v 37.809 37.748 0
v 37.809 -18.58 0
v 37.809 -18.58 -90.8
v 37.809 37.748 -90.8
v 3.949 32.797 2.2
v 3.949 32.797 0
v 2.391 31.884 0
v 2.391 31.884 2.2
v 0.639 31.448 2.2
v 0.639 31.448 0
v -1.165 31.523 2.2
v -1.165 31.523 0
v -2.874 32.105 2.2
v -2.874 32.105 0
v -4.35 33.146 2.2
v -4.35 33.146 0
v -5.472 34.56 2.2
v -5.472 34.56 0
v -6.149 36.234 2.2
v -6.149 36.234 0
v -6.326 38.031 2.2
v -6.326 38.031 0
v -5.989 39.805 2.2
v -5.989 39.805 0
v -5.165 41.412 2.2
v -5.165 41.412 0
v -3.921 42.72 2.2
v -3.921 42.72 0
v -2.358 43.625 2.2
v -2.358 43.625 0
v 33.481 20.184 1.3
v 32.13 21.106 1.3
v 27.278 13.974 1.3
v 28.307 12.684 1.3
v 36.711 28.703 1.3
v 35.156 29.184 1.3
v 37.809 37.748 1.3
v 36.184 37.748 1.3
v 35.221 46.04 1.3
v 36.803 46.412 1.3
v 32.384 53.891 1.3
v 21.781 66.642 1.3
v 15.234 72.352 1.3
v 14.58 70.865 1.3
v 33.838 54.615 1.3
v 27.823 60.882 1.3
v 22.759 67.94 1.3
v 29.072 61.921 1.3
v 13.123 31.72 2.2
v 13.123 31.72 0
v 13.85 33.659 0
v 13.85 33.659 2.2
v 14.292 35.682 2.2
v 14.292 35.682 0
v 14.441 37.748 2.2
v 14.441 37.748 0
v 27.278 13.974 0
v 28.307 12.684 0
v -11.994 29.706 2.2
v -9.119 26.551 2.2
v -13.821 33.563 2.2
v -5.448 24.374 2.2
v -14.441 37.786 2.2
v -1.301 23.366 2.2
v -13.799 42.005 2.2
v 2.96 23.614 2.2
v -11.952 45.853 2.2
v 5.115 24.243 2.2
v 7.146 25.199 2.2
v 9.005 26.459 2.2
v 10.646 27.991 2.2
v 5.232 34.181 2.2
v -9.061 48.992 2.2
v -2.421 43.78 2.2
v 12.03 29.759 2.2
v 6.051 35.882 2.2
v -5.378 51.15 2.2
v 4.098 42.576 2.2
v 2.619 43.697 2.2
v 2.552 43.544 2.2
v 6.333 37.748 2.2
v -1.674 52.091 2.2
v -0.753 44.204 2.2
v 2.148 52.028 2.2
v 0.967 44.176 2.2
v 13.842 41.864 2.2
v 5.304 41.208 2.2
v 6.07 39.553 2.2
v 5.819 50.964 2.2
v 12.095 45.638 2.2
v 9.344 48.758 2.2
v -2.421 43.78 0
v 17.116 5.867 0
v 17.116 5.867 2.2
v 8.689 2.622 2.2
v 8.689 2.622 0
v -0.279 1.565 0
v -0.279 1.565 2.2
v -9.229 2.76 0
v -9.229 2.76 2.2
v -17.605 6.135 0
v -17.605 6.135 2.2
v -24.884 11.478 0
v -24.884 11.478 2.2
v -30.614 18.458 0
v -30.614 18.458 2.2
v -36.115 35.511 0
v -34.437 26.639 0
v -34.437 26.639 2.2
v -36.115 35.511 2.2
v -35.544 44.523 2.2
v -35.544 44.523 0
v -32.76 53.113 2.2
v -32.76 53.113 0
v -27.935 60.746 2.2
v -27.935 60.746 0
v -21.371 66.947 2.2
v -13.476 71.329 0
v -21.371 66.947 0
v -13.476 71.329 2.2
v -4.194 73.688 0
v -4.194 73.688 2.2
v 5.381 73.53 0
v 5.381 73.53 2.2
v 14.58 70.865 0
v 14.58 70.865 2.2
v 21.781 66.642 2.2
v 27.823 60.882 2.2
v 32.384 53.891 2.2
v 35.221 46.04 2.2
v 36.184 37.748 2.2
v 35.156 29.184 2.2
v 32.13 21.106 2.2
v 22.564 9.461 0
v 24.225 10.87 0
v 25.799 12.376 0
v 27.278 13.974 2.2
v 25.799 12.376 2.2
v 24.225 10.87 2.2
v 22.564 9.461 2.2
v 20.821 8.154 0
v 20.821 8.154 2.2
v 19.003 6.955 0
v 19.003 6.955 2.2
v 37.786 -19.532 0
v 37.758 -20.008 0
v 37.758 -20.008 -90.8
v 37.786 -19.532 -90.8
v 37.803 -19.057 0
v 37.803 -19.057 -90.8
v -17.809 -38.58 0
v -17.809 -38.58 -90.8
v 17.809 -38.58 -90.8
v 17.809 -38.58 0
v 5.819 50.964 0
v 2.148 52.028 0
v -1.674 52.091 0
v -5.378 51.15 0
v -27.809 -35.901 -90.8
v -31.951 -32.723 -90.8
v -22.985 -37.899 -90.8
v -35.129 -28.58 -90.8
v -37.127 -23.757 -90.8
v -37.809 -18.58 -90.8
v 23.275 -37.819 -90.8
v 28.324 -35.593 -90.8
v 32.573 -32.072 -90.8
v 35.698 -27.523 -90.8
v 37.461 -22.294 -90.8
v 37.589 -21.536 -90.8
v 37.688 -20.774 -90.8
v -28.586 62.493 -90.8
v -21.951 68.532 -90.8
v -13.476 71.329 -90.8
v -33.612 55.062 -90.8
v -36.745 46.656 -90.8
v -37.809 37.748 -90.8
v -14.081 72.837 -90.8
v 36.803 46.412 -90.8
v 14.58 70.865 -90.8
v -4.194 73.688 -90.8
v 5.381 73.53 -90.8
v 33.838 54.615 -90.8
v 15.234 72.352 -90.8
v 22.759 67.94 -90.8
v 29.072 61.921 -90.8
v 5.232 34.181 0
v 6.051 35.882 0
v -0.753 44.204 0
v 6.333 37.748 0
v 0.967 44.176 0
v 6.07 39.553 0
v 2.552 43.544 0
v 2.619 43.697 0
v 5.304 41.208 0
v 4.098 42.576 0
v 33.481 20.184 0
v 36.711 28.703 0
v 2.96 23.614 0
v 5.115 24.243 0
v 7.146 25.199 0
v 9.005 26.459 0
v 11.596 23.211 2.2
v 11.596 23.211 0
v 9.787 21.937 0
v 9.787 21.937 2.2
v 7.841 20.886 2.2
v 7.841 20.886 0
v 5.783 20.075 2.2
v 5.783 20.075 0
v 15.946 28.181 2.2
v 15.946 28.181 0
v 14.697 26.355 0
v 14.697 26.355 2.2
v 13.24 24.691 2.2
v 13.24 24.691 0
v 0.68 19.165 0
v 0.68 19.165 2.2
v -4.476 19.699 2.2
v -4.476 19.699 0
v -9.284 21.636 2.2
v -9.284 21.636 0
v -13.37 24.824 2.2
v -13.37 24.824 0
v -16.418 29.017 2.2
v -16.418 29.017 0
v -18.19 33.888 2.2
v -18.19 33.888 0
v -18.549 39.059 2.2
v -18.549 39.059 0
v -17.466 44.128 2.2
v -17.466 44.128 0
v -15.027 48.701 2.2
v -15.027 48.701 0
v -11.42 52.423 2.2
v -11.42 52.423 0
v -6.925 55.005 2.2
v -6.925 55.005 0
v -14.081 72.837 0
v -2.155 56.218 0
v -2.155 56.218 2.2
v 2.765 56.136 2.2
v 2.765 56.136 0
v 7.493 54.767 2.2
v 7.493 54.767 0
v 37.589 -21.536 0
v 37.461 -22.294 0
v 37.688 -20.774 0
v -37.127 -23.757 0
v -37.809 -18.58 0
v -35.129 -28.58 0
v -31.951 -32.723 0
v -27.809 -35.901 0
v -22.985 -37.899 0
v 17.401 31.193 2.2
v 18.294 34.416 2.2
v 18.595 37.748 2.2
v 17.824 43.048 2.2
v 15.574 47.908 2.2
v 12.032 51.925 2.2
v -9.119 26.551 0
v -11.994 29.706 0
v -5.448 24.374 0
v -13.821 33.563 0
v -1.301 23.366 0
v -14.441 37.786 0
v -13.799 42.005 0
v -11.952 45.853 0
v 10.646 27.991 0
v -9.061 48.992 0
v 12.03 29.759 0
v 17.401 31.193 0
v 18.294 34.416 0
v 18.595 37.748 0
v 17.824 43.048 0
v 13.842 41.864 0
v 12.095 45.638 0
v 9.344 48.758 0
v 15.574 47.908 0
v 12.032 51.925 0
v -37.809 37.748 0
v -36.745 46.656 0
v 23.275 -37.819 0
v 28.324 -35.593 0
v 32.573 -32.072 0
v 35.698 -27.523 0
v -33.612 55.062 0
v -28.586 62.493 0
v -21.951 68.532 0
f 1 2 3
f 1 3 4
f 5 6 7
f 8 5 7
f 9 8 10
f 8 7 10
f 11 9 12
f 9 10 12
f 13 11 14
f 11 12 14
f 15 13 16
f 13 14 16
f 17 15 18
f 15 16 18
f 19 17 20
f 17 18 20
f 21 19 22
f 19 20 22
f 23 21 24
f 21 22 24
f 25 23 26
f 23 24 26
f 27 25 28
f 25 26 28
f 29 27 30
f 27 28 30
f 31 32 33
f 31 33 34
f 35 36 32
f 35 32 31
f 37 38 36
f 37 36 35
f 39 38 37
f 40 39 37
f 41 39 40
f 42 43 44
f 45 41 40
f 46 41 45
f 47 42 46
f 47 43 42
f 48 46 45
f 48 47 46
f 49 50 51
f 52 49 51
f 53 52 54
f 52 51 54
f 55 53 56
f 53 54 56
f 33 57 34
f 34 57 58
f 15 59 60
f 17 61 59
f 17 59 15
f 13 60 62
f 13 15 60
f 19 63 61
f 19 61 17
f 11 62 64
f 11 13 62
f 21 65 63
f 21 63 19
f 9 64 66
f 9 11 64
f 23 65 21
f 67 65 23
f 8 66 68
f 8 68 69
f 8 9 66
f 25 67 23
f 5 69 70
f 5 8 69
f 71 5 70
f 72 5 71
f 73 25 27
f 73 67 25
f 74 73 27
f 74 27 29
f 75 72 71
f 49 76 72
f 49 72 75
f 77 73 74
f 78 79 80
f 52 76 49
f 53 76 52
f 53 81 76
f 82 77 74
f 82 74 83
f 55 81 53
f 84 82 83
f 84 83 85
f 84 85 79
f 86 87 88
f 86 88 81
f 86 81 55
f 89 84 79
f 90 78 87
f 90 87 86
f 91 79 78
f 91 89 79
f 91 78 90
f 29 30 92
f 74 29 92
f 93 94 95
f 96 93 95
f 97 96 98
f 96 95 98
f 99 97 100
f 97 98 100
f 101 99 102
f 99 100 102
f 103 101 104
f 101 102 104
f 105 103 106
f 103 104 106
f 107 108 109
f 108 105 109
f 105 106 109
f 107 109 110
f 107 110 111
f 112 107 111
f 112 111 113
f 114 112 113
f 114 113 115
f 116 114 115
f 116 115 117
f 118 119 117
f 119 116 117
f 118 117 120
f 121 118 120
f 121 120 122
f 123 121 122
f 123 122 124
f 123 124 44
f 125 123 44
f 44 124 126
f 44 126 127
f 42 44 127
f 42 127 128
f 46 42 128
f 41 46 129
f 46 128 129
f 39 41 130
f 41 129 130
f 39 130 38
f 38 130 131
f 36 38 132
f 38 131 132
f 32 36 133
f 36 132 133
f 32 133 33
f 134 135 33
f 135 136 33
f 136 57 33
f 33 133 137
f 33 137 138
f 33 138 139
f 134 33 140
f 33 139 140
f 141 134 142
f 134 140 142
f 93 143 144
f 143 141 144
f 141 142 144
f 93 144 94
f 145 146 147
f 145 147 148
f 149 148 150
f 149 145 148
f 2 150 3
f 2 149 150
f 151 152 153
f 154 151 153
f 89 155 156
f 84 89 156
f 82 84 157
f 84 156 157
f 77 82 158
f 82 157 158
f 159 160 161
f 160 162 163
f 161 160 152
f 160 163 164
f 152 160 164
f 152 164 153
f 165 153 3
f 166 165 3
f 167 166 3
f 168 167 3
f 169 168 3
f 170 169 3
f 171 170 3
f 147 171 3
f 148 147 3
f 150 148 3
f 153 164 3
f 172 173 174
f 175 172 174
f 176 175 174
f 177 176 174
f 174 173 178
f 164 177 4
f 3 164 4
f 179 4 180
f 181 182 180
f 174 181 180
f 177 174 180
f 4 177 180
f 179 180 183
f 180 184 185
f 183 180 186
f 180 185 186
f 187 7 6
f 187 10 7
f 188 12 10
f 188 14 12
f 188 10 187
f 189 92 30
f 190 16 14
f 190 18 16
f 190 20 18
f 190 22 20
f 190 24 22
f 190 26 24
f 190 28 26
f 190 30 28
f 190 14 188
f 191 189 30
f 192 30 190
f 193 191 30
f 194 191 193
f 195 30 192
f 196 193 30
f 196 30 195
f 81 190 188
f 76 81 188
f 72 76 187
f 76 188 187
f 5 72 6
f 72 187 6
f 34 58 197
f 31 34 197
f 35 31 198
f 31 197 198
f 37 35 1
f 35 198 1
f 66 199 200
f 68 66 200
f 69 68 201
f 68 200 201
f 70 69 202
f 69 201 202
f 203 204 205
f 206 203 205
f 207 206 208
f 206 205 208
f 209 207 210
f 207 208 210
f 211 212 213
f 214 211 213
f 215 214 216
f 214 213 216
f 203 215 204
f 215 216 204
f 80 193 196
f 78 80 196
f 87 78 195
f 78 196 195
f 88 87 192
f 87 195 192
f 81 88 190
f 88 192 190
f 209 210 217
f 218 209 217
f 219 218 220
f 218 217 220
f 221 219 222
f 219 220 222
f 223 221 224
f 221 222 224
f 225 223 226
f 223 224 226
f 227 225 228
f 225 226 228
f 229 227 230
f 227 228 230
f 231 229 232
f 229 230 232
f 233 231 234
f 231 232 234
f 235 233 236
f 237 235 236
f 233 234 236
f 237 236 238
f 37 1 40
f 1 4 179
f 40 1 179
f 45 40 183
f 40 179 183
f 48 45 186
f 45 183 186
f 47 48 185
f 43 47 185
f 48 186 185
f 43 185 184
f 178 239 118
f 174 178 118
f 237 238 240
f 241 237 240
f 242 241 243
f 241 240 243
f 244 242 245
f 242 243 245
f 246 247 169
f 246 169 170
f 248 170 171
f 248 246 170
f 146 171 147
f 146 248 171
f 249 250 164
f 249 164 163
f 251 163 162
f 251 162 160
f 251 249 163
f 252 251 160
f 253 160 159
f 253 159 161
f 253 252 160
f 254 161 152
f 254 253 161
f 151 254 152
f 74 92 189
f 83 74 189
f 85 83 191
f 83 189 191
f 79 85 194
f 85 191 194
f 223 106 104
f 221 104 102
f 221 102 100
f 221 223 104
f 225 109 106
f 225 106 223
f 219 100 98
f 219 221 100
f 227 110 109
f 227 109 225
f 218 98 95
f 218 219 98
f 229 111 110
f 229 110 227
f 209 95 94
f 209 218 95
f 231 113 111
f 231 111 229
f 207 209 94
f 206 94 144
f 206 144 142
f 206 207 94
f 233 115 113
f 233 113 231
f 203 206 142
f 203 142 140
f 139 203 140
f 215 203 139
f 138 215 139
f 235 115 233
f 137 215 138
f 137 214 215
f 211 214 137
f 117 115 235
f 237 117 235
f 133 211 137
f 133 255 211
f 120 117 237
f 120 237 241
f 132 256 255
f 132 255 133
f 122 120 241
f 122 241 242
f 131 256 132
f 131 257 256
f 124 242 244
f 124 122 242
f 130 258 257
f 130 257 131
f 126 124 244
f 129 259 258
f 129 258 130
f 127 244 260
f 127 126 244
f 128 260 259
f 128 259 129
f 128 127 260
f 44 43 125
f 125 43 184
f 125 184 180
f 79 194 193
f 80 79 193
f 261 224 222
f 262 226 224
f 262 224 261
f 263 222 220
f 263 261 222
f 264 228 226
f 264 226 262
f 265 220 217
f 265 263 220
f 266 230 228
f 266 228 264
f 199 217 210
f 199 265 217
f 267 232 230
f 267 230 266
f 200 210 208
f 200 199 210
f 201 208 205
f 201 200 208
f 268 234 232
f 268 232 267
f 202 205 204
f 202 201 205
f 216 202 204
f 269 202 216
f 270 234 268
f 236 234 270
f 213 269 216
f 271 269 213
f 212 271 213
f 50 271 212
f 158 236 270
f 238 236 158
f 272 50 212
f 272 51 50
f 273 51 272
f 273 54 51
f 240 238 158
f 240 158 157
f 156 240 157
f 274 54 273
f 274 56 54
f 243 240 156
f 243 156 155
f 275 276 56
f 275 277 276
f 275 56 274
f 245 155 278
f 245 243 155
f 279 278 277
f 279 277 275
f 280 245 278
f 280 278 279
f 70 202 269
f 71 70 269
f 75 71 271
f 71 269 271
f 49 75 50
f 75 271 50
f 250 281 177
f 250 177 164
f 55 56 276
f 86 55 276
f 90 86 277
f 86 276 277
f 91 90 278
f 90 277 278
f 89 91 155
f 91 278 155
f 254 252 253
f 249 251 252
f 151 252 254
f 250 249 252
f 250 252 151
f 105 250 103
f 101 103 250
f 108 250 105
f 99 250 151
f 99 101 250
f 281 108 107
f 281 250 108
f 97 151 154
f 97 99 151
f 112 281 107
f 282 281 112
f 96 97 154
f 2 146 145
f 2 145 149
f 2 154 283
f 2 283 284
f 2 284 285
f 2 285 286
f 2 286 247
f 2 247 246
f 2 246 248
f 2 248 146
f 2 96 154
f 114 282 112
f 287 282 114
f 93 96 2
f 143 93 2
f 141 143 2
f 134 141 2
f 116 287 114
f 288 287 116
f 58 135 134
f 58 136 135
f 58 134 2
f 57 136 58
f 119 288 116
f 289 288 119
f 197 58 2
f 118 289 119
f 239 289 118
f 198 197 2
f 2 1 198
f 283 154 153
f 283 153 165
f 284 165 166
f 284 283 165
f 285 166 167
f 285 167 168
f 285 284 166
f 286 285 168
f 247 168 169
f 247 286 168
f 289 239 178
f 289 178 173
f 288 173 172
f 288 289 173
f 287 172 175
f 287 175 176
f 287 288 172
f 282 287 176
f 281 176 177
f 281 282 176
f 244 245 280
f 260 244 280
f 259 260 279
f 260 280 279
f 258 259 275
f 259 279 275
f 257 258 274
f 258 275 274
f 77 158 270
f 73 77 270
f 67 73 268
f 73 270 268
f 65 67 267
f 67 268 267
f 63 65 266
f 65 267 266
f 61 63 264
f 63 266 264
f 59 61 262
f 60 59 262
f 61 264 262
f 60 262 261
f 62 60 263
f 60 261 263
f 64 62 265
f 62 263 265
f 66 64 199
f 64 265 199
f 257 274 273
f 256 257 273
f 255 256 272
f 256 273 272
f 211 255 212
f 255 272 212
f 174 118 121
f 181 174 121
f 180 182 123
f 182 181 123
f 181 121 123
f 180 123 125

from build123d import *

# Parameters (mm, degrees)
F1_DEPTH = 90.8
F2_DEPTH = 2.2
F3_DEPTH = 98.2
F4_DEPTH = 1.3


with BuildPart() as f1:
    # F0 (on Top) → F1 (new body)
    with BuildSketch(Plane.XY):
        with BuildLine():
            Line((14.5797743075, 70.8647903861), (15.2343665475, 72.3516513901))
            ThreePointArc((15.2343665475, 72.3516513901), (9.7510541905, 74.2776447369), (4.0373458892, 75.3405192466))
            Line((4.0373458892, 75.3405192466), (-3.8493320938, 75.3602360583))
            ThreePointArc((-3.8493320938, 75.3602360583), (-9.0534728718, 74.4567533778), (-14.0809194048, 72.8368325308))
            Line((-14.0809194048, 72.8368325308), (-13.4758886314, 71.3291242006))
            ThreePointArc((-13.4758886314, 71.3291242006), (0.5987840757, 73.9271667972), (14.5797743075, 70.8647903861))
        make_face()
        with BuildLine():
            ThreePointArc((17.1155876174, 5.8674587356), (-32.7813859307, 22.4284787369), (-13.4758886314, 71.3291242006))
            Line((-13.4758886314, 71.3291242006), (-14.0809194048, 72.8368325308))
            ThreePointArc((-14.0809194048, 72.8368325308), (-31.3200658488, 58.9271489213), (-37.8088560378, 37.7478413284))
            ThreePointArc((-37.8088560378, 37.7478413284), (-34.519772796, 22.3240000103), (-25.2247735802, 9.5836727321))
            ThreePointArc((-25.2247735802, 9.5836727321), (-4.3356388326, 0.1883973655), (18.1446666572, 4.5773624836))
            Line((18.1446666572, 4.5773624836), (17.1155876174, 5.8674587356))
        make_face()
        with BuildLine():
            ThreePointArc((28.3074712637, 12.6839895584), (35.3538024878, 24.3456682007), (37.8088560378, 37.7478413284))
            ThreePointArc((37.8088560378, 37.7478413284), (31.6662562242, 58.4059586587), (15.2343665475, 72.3516513901))
            Line((15.2343665475, 72.3516513901), (14.5797743075, 70.8647903861))
            ThreePointArc((14.5797743075, 70.8647903861), (30.3056164149, 57.5183179908), (36.1842802022, 37.7478413284))
            ThreePointArc((36.1842802022, 37.7478413284), (33.8847393486, 25.0542770919), (27.2783922239, 13.9740858104))
            Line((27.2783922239, 13.9740858104), (28.3074712637, 12.6839895584))
        make_face()
        with BuildLine():
            Line((7.4925671367, 54.7666894219), (14.5797743075, 70.8647903861))
            ThreePointArc((14.5797743075, 70.8647903861), (0.5987840757, 73.9271667972), (-13.4758886314, 71.3291242006))
            Line((-13.4758886314, 71.3291242006), (-6.9252786887, 55.0053112418))
            ThreePointArc((-6.9252786887, 55.0053112418), (0.3077160039, 56.3404490957), (7.4925671367, 54.7666894219))
        make_face()
        with BuildLine():
            ThreePointArc((36.1842802022, 37.7478413284), (30.3056164149, 57.5183179908), (14.5797743075, 70.8647903861))
            Line((14.5797743075, 70.8647903861), (7.4925671367, 54.7666894219))
            ThreePointArc((7.4925671367, 54.7666894219), (15.5741001759, 47.9079179245), (18.5951540119, 37.7478413284))
            ThreePointArc((18.5951540119, 37.7478413284), (17.9205267119, 32.7845284132), (15.9455954142, 28.1813508739))
            Line((15.9455954142, 28.1813508739), (27.2783922239, 13.9740858104))
            ThreePointArc((27.2783922239, 13.9740858104), (33.8847393486, 25.0542770919), (36.1842802022, 37.7478413284))
        make_face()
        with BuildLine():
            Line((-6.9252786887, 55.0053112418), (-13.4758886314, 71.3291242006))
            ThreePointArc((-13.4758886314, 71.3291242006), (-32.7813859307, 22.4284787369), (17.1155876174, 5.8674587356))
            Line((17.1155876174, 5.8674587356), (5.7827908077, 20.0747237991))
            ThreePointArc((5.7827908077, 20.0747237991), (-17.4746331696, 31.3904088029), (-6.9252786887, 55.0053112418))
        make_face()
        with BuildLine():
            Line((5.8186014769, 50.9643921908), (7.4925671367, 54.7666894219))
            ThreePointArc((7.4925671367, 54.7666894219), (0.3077160039, 56.3404490957), (-6.9252786887, 55.0053112418))
            Line((-6.9252786887, 55.0053112418), (-5.3780548203, 51.1497018781))
            ThreePointArc((-5.3780548203, 51.1497018781), (0.2389670672, 52.1865474541), (5.8186014769, 50.9643921908))
        make_face()
        with BuildLine():
            Line((-5.3780548203, 51.1497018781), (-6.9252786887, 55.0053112418))
            ThreePointArc((-6.9252786887, 55.0053112418), (-17.4746331696, 31.3904088029), (5.7827908077, 20.0747237991))
            Line((5.7827908077, 20.0747237991), (2.9598041396, 23.6137372075))
            ThreePointArc((2.9598041396, 23.6137372075), (-13.8209739771, 33.5628660392), (-5.3780548203, 51.1497018781))
        make_face()
        with BuildLine():
            ThreePointArc((18.5951540119, 37.7478413284), (15.5741001759, 47.9079179245), (7.4925671367, 54.7666894219))
            Line((7.4925671367, 54.7666894219), (5.8186014769, 50.9643921908))
            ThreePointArc((5.8186014769, 50.9643921908), (12.0945839566, 45.6379857353), (14.4406834965, 37.7478413284))
            ThreePointArc((14.4406834965, 37.7478413284), (14.1073168851, 34.6628858754), (13.1226087461, 31.7203642823))
            Line((13.1226087461, 31.7203642823), (15.9455954142, 28.1813508739))
            ThreePointArc((15.9455954142, 28.1813508739), (17.9205267119, 32.7845284132), (18.5951540119, 37.7478413284))
        make_face()
        with BuildLine():
            ThreePointArc((9.0050181393, 26.4587763469), (11.3722928557, 28.848161837), (13.1226087461, 31.7203642823))
            Line((13.1226087461, 31.7203642823), (5.0814023033, 41.8011548658))
            ThreePointArc((5.0814023033, 41.8011548658), (3.9651803512, 42.8983116741), (2.619052596, 43.6968381765))
            Line((2.619052596, 43.6968381765), (2.5515787198, 43.5435759329))
            ThreePointArc((2.5515787198, 43.5435759329), (5.3037285971, 41.2078350476), (6.3325424253, 37.7478413284))
            ThreePointArc((6.3325424253, 37.7478413284), (5.7055938383, 35.000607716), (3.9488892214, 32.7973496875))
            Line((3.9488892214, 32.7973496875), (9.0050181393, 26.4587763469))
        make_face()
        with BuildLine():
            ThreePointArc((2.9598041396, 23.6137372075), (6.1492117355, 24.6818344832), (9.0050181393, 26.4587763469))
            Line((9.0050181393, 26.4587763469), (3.9488892214, 32.7973496875))
            ThreePointArc((3.9488892214, 32.7973496875), (-5.4718414208, 34.5603587741), (-2.3583897759, 43.6248381153))
            Line((-2.3583897759, 43.6248381153), (-2.4207549691, 43.7802492539))
            ThreePointArc((-2.4207549691, 43.7802492539), (-6.2849849078, 39.405841542), (-5.0814023033, 33.694527791))
            Line((-5.0814023033, 33.694527791), (2.9598041396, 23.6137372075))
        make_face()
        with BuildLine():
            Line((2.5515787198, 43.5435759329), (2.619052596, 43.6968381765))
            ThreePointArc((2.619052596, 43.6968381765), (0.1075631868, 44.2469512798), (-2.4207549691, 43.7802492539))
            Line((-2.4207549691, 43.7802492539), (-2.3583897759, 43.6248381153))
            ThreePointArc((-2.3583897759, 43.6248381153), (0.1047920683, 44.0795166352), (2.5515787198, 43.5435759329))
        make_face()
        with BuildLine():
            Line((2.619052596, 43.6968381765), (5.8186014769, 50.9643921908))
            ThreePointArc((5.8186014769, 50.9643921908), (0.2389670672, 52.1865474541), (-5.3780548203, 51.1497018781))
            Line((-5.3780548203, 51.1497018781), (-2.4207549691, 43.7802492539))
            ThreePointArc((-2.4207549691, 43.7802492539), (0.1075631868, 44.2469512798), (2.619052596, 43.6968381765))
        make_face()
        with BuildLine():
            Line((0, 37.7478413284), (2.5515787198, 43.5435759329))
            ThreePointArc((2.5515787198, 43.5435759329), (0.1047920683, 44.0795166352), (-2.3583897759, 43.6248381153))
            Line((-2.3583897759, 43.6248381153), (0, 37.7478413284))
        make_face()
        with BuildLine():
            ThreePointArc((6.3325424253, 37.7478413284), (5.3037285971, 41.2078350476), (2.5515787198, 43.5435759329))
            Line((2.5515787198, 43.5435759329), (0, 37.7478413284))
            Line((0, 37.7478413284), (3.9488892214, 32.7973496875))
            ThreePointArc((3.9488892214, 32.7973496875), (5.7055938383, 35.000607716), (6.3325424253, 37.7478413284))
        make_face()
        with BuildLine():
            ThreePointArc((-2.3583897759, 43.6248381153), (-5.4718414208, 34.5603587741), (3.9488892214, 32.7973496875))
            Line((3.9488892214, 32.7973496875), (0, 37.7478413284))
            Line((0, 37.7478413284), (-2.3583897759, 43.6248381153))
        make_face()
        with BuildLine():
            ThreePointArc((14.4406834965, 37.7478413284), (12.0945839566, 45.6379857353), (5.8186014769, 50.9643921908))
            Line((5.8186014769, 50.9643921908), (2.619052596, 43.6968381765))
            ThreePointArc((2.619052596, 43.6968381765), (3.9651803512, 42.8983116741), (5.0814023033, 41.8011548658))
            Line((5.0814023033, 41.8011548658), (13.1226087461, 31.7203642823))
            ThreePointArc((13.1226087461, 31.7203642823), (14.1073168851, 34.6628858754), (14.4406834965, 37.7478413284))
        make_face()
        with BuildLine():
            Line((-2.4207549691, 43.7802492539), (-5.3780548203, 51.1497018781))
            ThreePointArc((-5.3780548203, 51.1497018781), (-13.8209739771, 33.5628660392), (2.9598041396, 23.6137372075))
            Line((2.9598041396, 23.6137372075), (-5.0814023033, 33.694527791))
            ThreePointArc((-5.0814023033, 33.694527791), (-6.2849849078, 39.405841542), (-2.4207549691, 43.7802492539))
        make_face()
        with BuildLine():
            ThreePointArc((11.5956906903, 23.2110015706), (13.9930948371, 25.5014929091), (15.9455954142, 28.1813508739))
            Line((15.9455954142, 28.1813508739), (13.1226087461, 31.7203642823))
            ThreePointArc((13.1226087461, 31.7203642823), (11.3722928557, 28.848161837), (9.0050181393, 26.4587763469))
            Line((9.0050181393, 26.4587763469), (11.5956906903, 23.2110015706))
        make_face()
        with BuildLine():
            ThreePointArc((22.564035813, 9.4606282882), (25.0231839072, 11.6108483703), (27.2783922239, 13.9740858104))
            Line((27.2783922239, 13.9740858104), (15.9455954142, 28.1813508739))
            ThreePointArc((15.9455954142, 28.1813508739), (13.9930948371, 25.5014929091), (11.5956906903, 23.2110015706))
            Line((11.5956906903, 23.2110015706), (22.564035813, 9.4606282882))
        make_face()
        with BuildLine():
            ThreePointArc((17.1155876174, 5.8674587356), (19.9209900797, 7.5409499293), (22.564035813, 9.4606282882))
            Line((22.564035813, 9.4606282882), (11.5956906903, 23.2110015706))
            ThreePointArc((11.5956906903, 23.2110015706), (8.8296072596, 21.3827019043), (5.7827908077, 20.0747237991))
            Line((5.7827908077, 20.0747237991), (17.1155876174, 5.8674587356))
        make_face()
        with BuildLine():
            ThreePointArc((5.7827908077, 20.0747237991), (8.8296072596, 21.3827019043), (11.5956906903, 23.2110015706))
            Line((11.5956906903, 23.2110015706), (9.0050181393, 26.4587763469))
            ThreePointArc((9.0050181393, 26.4587763469), (6.1492117355, 24.6818344832), (2.9598041396, 23.6137372075))
            Line((2.9598041396, 23.6137372075), (5.7827908077, 20.0747237991))
        make_face()
        with BuildLine():
            ThreePointArc((25.2247735802, 9.5836727321), (26.8109735111, 11.0892349455), (28.3074712637, 12.6839895584))
            Line((28.3074712637, 12.6839895584), (27.2783922239, 13.9740858104))
            ThreePointArc((27.2783922239, 13.9740858104), (25.0231839072, 11.6108483703), (22.564035813, 9.4606282882))
            Line((22.564035813, 9.4606282882), (23.5770996941, 8.1906093047))
            ThreePointArc((23.5770996941, 8.1906093047), (24.4108759613, 8.8753850821), (25.2247735802, 9.5836727321))
        make_face()
        with BuildLine():
            ThreePointArc((18.1446666572, 4.5773624836), (20.9389669042, 6.266588814), (23.5770996941, 8.1906093047))
            Line((23.5770996941, 8.1906093047), (22.564035813, 9.4606282882))
            ThreePointArc((22.564035813, 9.4606282882), (19.9209900797, 7.5409499293), (17.1155876174, 5.8674587356))
            Line((17.1155876174, 5.8674587356), (18.1446666572, 4.5773624836))
        make_face()
        with BuildLine():
            Line((25.9509916616, 9.5836727321), (25.2247735802, 9.5836727321))
            ThreePointArc((25.2247735802, 9.5836727321), (24.4108759613, 8.8753850821), (23.5770996941, 8.1906093047))
            Line((23.5770996941, 8.1906093047), (31.9509916616, -2.3072496786))
            Line((31.9509916616, -2.3072496786), (31.9509916616, 3.5836727321))
            ThreePointArc((31.9509916616, 3.5836727321), (30.1936323487, 7.8263134192), (25.9509916616, 9.5836727321))
        make_face()
        with BuildLine():
            Line((37.8088560378, 0.7726587349), (28.3074712637, 12.6839895584))
            ThreePointArc((28.3074712637, 12.6839895584), (26.8109735111, 11.0892349455), (25.2247735802, 9.5836727321))
            Line((25.2247735802, 9.5836727321), (25.9509916616, 9.5836727321))
            ThreePointArc((25.9509916616, 9.5836727321), (30.1936323487, 7.8263134192), (31.9509916616, 3.5836727321))
            Line((31.9509916616, 3.5836727321), (31.9509916616, -2.3072496786))
            Line((31.9509916616, -2.3072496786), (37.5423985462, -9.316869724))
            ThreePointArc((37.5423985462, -9.316869724), (37.6746019819, -9.2135722748), (37.8088560378, -9.1129543843))
            Line((37.8088560378, -9.1129543843), (37.8088560378, 0.7726587349))
        make_face()
        with BuildLine():
            Line((31.9509916616, -2.3072496786), (23.5770996941, 8.1906093047))
            ThreePointArc((23.5770996941, 8.1906093047), (20.9389669042, 6.266588814), (18.1446666572, 4.5773624836))
            Line((18.1446666572, 4.5773624836), (31.950989986, -12.7308182222))
            ThreePointArc((31.950989986, -12.7308182222), (31.9509912427, -12.7267248551), (31.9509916616, -12.7226314879))
            Line((31.9509916616, -12.7226314879), (31.9509916616, -2.3072496786))
        make_face()
        with BuildLine():
            ThreePointArc((34.4023500944, -15.8039451307), (35.2356894452, -12.2038174301), (37.5423985462, -9.316869724))
            Line((37.5423985462, -9.316869724), (31.9509916616, -2.3072496786))
            Line((31.9509916616, -2.3072496786), (31.9509916616, -12.7226314879))
            ThreePointArc((31.9509916616, -12.7226314879), (31.9509912427, -12.7267248551), (31.950989986, -12.7308182222))
            Line((31.950989986, -12.7308182222), (34.4023500944, -15.8039451307))
        make_face()
        with BuildLine():
            Line((37.8088560378, -18.5804958642), (37.8088560378, -9.6509119093))
            Line((37.8088560378, -9.6509119093), (37.5423985462, -9.316869724))
            ThreePointArc((37.5423985462, -9.316869724), (35.2356894452, -12.2038174301), (34.4023500944, -15.8039451307))
            Line((34.4023500944, -15.8039451307), (37.6630889461, -19.8917428692))
            ThreePointArc((37.6630889461, -19.8917428692), (37.7101411831, -19.950037218), (37.7578621419, -20.0077854145))
            ThreePointArc((37.7578621419, -20.0077854145), (37.7961034982, -19.2945959688), (37.8088560378, -18.5804958642))
        make_face()
        with BuildLine():
            Line((37.8088560378, -9.6509119093), (37.8088560378, -9.1129543843))
            ThreePointArc((37.8088560378, -9.1129543843), (37.6746019819, -9.2135722748), (37.5423985462, -9.316869724))
            Line((37.5423985462, -9.316869724), (37.8088560378, -9.6509119093))
        make_face()
        with BuildLine():
            Line((37.6630889461, -19.8917428692), (34.4023500944, -15.8039451307))
            ThreePointArc((34.4023500944, -15.8039451307), (35.1982840172, -19.3947286188), (37.4610329077, -22.294246566))
            ThreePointArc((37.4610329077, -22.294246566), (37.6424235279, -21.1552969472), (37.7578621419, -20.0077854145))
            ThreePointArc((37.7578621419, -20.0077854145), (37.7101411831, -19.950037218), (37.6630889461, -19.8917428692))
        make_face()
        with BuildLine():
            ThreePointArc((37.4610329077, -22.294246566), (35.1982840172, -19.3947286188), (34.4023500944, -15.8039451307))
            Line((34.4023500944, -15.8039451307), (31.950989986, -12.7308182222))
            ThreePointArc((31.950989986, -12.7308182222), (26.0902325414, -26.8676612631), (11.9509916616, -32.7226314879))
            Line((11.9509916616, -32.7226314879), (-11.2525294721, -32.7226314879))
            ThreePointArc((-11.2525294721, -32.7226314879), (-25.3946650958, -26.8647671116), (-31.2525294721, -12.7226314879))
            Line((-31.2525294721, -12.7226314879), (-31.2525294721, 3.5836727321))
            ThreePointArc((-31.2525294721, 3.5836727321), (-29.4951701592, 7.8263134192), (-25.2525294721, 9.5836727321))
            Line((-25.2525294721, 9.5836727321), (-25.2247735802, 9.5836727321))
            ThreePointArc((-25.2247735802, 9.5836727321), (-34.519772796, 22.3240000103), (-37.8088560378, 37.7478413284))
            Line((-37.8088560378, 37.7478413284), (-37.8088560378, -18.5804958642))
            ThreePointArc((-37.8088560378, -18.5804958642), (-31.9509916616, -32.7226314879), (-17.8088560378, -38.5804958642))
            Line((-17.8088560378, -38.5804958642), (17.8088560378, -38.5804958642))
            ThreePointArc((17.8088560378, -38.5804958642), (30.570615046, -33.9797655552), (37.4610329077, -22.294246566))
        make_face()
        with BuildLine():
            Line((31.950989986, -12.7308182222), (18.1446666572, 4.5773624836))
            ThreePointArc((18.1446666572, 4.5773624836), (-4.3356388326, 0.1883973655), (-25.2247735802, 9.5836727321))
            Line((-25.2247735802, 9.5836727321), (-25.2525294721, 9.5836727321))
            ThreePointArc((-25.2525294721, 9.5836727321), (-29.4951701592, 7.8263134192), (-31.2525294721, 3.5836727321))
            Line((-31.2525294721, 3.5836727321), (-31.2525294721, -12.7226314879))
            ThreePointArc((-31.2525294721, -12.7226314879), (-25.3946650958, -26.8647671116), (-11.2525294721, -32.7226314879))
            Line((-11.2525294721, -32.7226314879), (11.9509916616, -32.7226314879))
            ThreePointArc((11.9509916616, -32.7226314879), (26.0902325414, -26.8676612631), (31.950989986, -12.7308182222))
        make_face()
        with BuildLine():
            Line((37.8088560378, 0.7726587349), (37.8088560378, 37.7478413284))
            ThreePointArc((37.8088560378, 37.7478413284), (35.3538024878, 24.3456682007), (28.3074712637, 12.6839895584))
            Line((28.3074712637, 12.6839895584), (37.8088560378, 0.7726587349))
        make_face()
    extrude(amount=-F1_DEPTH)

    # F0 (on Top) → F2 (join)
    with BuildSketch(Plane.XY):
        with BuildLine():
            ThreePointArc((36.1842802022, 37.7478413284), (30.3056164149, 57.5183179908), (14.5797743075, 70.8647903861))
            Line((14.5797743075, 70.8647903861), (7.4925671367, 54.7666894219))
            ThreePointArc((7.4925671367, 54.7666894219), (15.5741001759, 47.9079179245), (18.5951540119, 37.7478413284))
            ThreePointArc((18.5951540119, 37.7478413284), (17.9205267119, 32.7845284132), (15.9455954142, 28.1813508739))
            Line((15.9455954142, 28.1813508739), (27.2783922239, 13.9740858104))
            ThreePointArc((27.2783922239, 13.9740858104), (33.8847393486, 25.0542770919), (36.1842802022, 37.7478413284))
        make_face()
        with BuildLine():
            ThreePointArc((22.564035813, 9.4606282882), (25.0231839072, 11.6108483703), (27.2783922239, 13.9740858104))
            Line((27.2783922239, 13.9740858104), (15.9455954142, 28.1813508739))
            ThreePointArc((15.9455954142, 28.1813508739), (13.9930948371, 25.5014929091), (11.5956906903, 23.2110015706))
            Line((11.5956906903, 23.2110015706), (22.564035813, 9.4606282882))
        make_face()
        with BuildLine():
            ThreePointArc((17.1155876174, 5.8674587356), (19.9209900797, 7.5409499293), (22.564035813, 9.4606282882))
            Line((22.564035813, 9.4606282882), (11.5956906903, 23.2110015706))
            ThreePointArc((11.5956906903, 23.2110015706), (8.8296072596, 21.3827019043), (5.7827908077, 20.0747237991))
            Line((5.7827908077, 20.0747237991), (17.1155876174, 5.8674587356))
        make_face()
        with BuildLine():
            Line((-6.9252786887, 55.0053112418), (-13.4758886314, 71.3291242006))
            ThreePointArc((-13.4758886314, 71.3291242006), (-32.7813859307, 22.4284787369), (17.1155876174, 5.8674587356))
            Line((17.1155876174, 5.8674587356), (5.7827908077, 20.0747237991))
            ThreePointArc((5.7827908077, 20.0747237991), (-17.4746331696, 31.3904088029), (-6.9252786887, 55.0053112418))
        make_face()
        with BuildLine():
            Line((7.4925671367, 54.7666894219), (14.5797743075, 70.8647903861))
            ThreePointArc((14.5797743075, 70.8647903861), (0.5987840757, 73.9271667972), (-13.4758886314, 71.3291242006))
            Line((-13.4758886314, 71.3291242006), (-6.9252786887, 55.0053112418))
            ThreePointArc((-6.9252786887, 55.0053112418), (0.3077160039, 56.3404490957), (7.4925671367, 54.7666894219))
        make_face()
        with BuildLine():
            ThreePointArc((14.4406834965, 37.7478413284), (12.0945839566, 45.6379857353), (5.8186014769, 50.9643921908))
            Line((5.8186014769, 50.9643921908), (2.619052596, 43.6968381765))
            ThreePointArc((2.619052596, 43.6968381765), (3.9651803512, 42.8983116741), (5.0814023033, 41.8011548658))
            Line((5.0814023033, 41.8011548658), (13.1226087461, 31.7203642823))
            ThreePointArc((13.1226087461, 31.7203642823), (14.1073168851, 34.6628858754), (14.4406834965, 37.7478413284))
        make_face()
        with BuildLine():
            ThreePointArc((9.0050181393, 26.4587763469), (11.3722928557, 28.848161837), (13.1226087461, 31.7203642823))
            Line((13.1226087461, 31.7203642823), (5.0814023033, 41.8011548658))
            ThreePointArc((5.0814023033, 41.8011548658), (3.9651803512, 42.8983116741), (2.619052596, 43.6968381765))
            Line((2.619052596, 43.6968381765), (2.5515787198, 43.5435759329))
            ThreePointArc((2.5515787198, 43.5435759329), (5.3037285971, 41.2078350476), (6.3325424253, 37.7478413284))
            ThreePointArc((6.3325424253, 37.7478413284), (5.7055938383, 35.000607716), (3.9488892214, 32.7973496875))
            Line((3.9488892214, 32.7973496875), (9.0050181393, 26.4587763469))
        make_face()
        with BuildLine():
            ThreePointArc((2.9598041396, 23.6137372075), (6.1492117355, 24.6818344832), (9.0050181393, 26.4587763469))
            Line((9.0050181393, 26.4587763469), (3.9488892214, 32.7973496875))
            ThreePointArc((3.9488892214, 32.7973496875), (-5.4718414208, 34.5603587741), (-2.3583897759, 43.6248381153))
            Line((-2.3583897759, 43.6248381153), (-2.4207549691, 43.7802492539))
            ThreePointArc((-2.4207549691, 43.7802492539), (-6.2849849078, 39.405841542), (-5.0814023033, 33.694527791))
            Line((-5.0814023033, 33.694527791), (2.9598041396, 23.6137372075))
        make_face()
        with BuildLine():
            Line((-2.4207549691, 43.7802492539), (-5.3780548203, 51.1497018781))
            ThreePointArc((-5.3780548203, 51.1497018781), (-13.8209739771, 33.5628660392), (2.9598041396, 23.6137372075))
            Line((2.9598041396, 23.6137372075), (-5.0814023033, 33.694527791))
            ThreePointArc((-5.0814023033, 33.694527791), (-6.2849849078, 39.405841542), (-2.4207549691, 43.7802492539))
        make_face()
        with BuildLine():
            Line((2.619052596, 43.6968381765), (5.8186014769, 50.9643921908))
            ThreePointArc((5.8186014769, 50.9643921908), (0.2389670672, 52.1865474541), (-5.3780548203, 51.1497018781))
            Line((-5.3780548203, 51.1497018781), (-2.4207549691, 43.7802492539))
            ThreePointArc((-2.4207549691, 43.7802492539), (0.1075631868, 44.2469512798), (2.619052596, 43.6968381765))
        make_face()
    extrude(amount=F2_DEPTH)

    # F0 (on Top) → F3 (cut)
    with BuildSketch(Plane.XY):
        with BuildLine():
            Line((14.5797743075, 70.8647903861), (15.2343665475, 72.3516513901))
            ThreePointArc((15.2343665475, 72.3516513901), (9.7510541905, 74.2776447369), (4.0373458892, 75.3405192466))
            Line((4.0373458892, 75.3405192466), (-3.8493320938, 75.3602360583))
            ThreePointArc((-3.8493320938, 75.3602360583), (-9.0534728718, 74.4567533778), (-14.0809194048, 72.8368325308))
            Line((-14.0809194048, 72.8368325308), (-13.4758886314, 71.3291242006))
            ThreePointArc((-13.4758886314, 71.3291242006), (0.5987840757, 73.9271667972), (14.5797743075, 70.8647903861))
        make_face()
    extrude(amount=-F3_DEPTH, mode=Mode.SUBTRACT)

    # F0 (on Top) → F4 (join)
    with BuildSketch(Plane.XY):
        with BuildLine():
            ThreePointArc((28.3074712637, 12.6839895584), (35.3538024878, 24.3456682007), (37.8088560378, 37.7478413284))
            ThreePointArc((37.8088560378, 37.7478413284), (31.6662562242, 58.4059586587), (15.2343665475, 72.3516513901))
            Line((15.2343665475, 72.3516513901), (14.5797743075, 70.8647903861))
            ThreePointArc((14.5797743075, 70.8647903861), (30.3056164149, 57.5183179908), (36.1842802022, 37.7478413284))
            ThreePointArc((36.1842802022, 37.7478413284), (33.8847393486, 25.0542770919), (27.2783922239, 13.9740858104))
            Line((27.2783922239, 13.9740858104), (28.3074712637, 12.6839895584))
        make_face()
    extrude(amount=F4_DEPTH)


solid = f1.part
